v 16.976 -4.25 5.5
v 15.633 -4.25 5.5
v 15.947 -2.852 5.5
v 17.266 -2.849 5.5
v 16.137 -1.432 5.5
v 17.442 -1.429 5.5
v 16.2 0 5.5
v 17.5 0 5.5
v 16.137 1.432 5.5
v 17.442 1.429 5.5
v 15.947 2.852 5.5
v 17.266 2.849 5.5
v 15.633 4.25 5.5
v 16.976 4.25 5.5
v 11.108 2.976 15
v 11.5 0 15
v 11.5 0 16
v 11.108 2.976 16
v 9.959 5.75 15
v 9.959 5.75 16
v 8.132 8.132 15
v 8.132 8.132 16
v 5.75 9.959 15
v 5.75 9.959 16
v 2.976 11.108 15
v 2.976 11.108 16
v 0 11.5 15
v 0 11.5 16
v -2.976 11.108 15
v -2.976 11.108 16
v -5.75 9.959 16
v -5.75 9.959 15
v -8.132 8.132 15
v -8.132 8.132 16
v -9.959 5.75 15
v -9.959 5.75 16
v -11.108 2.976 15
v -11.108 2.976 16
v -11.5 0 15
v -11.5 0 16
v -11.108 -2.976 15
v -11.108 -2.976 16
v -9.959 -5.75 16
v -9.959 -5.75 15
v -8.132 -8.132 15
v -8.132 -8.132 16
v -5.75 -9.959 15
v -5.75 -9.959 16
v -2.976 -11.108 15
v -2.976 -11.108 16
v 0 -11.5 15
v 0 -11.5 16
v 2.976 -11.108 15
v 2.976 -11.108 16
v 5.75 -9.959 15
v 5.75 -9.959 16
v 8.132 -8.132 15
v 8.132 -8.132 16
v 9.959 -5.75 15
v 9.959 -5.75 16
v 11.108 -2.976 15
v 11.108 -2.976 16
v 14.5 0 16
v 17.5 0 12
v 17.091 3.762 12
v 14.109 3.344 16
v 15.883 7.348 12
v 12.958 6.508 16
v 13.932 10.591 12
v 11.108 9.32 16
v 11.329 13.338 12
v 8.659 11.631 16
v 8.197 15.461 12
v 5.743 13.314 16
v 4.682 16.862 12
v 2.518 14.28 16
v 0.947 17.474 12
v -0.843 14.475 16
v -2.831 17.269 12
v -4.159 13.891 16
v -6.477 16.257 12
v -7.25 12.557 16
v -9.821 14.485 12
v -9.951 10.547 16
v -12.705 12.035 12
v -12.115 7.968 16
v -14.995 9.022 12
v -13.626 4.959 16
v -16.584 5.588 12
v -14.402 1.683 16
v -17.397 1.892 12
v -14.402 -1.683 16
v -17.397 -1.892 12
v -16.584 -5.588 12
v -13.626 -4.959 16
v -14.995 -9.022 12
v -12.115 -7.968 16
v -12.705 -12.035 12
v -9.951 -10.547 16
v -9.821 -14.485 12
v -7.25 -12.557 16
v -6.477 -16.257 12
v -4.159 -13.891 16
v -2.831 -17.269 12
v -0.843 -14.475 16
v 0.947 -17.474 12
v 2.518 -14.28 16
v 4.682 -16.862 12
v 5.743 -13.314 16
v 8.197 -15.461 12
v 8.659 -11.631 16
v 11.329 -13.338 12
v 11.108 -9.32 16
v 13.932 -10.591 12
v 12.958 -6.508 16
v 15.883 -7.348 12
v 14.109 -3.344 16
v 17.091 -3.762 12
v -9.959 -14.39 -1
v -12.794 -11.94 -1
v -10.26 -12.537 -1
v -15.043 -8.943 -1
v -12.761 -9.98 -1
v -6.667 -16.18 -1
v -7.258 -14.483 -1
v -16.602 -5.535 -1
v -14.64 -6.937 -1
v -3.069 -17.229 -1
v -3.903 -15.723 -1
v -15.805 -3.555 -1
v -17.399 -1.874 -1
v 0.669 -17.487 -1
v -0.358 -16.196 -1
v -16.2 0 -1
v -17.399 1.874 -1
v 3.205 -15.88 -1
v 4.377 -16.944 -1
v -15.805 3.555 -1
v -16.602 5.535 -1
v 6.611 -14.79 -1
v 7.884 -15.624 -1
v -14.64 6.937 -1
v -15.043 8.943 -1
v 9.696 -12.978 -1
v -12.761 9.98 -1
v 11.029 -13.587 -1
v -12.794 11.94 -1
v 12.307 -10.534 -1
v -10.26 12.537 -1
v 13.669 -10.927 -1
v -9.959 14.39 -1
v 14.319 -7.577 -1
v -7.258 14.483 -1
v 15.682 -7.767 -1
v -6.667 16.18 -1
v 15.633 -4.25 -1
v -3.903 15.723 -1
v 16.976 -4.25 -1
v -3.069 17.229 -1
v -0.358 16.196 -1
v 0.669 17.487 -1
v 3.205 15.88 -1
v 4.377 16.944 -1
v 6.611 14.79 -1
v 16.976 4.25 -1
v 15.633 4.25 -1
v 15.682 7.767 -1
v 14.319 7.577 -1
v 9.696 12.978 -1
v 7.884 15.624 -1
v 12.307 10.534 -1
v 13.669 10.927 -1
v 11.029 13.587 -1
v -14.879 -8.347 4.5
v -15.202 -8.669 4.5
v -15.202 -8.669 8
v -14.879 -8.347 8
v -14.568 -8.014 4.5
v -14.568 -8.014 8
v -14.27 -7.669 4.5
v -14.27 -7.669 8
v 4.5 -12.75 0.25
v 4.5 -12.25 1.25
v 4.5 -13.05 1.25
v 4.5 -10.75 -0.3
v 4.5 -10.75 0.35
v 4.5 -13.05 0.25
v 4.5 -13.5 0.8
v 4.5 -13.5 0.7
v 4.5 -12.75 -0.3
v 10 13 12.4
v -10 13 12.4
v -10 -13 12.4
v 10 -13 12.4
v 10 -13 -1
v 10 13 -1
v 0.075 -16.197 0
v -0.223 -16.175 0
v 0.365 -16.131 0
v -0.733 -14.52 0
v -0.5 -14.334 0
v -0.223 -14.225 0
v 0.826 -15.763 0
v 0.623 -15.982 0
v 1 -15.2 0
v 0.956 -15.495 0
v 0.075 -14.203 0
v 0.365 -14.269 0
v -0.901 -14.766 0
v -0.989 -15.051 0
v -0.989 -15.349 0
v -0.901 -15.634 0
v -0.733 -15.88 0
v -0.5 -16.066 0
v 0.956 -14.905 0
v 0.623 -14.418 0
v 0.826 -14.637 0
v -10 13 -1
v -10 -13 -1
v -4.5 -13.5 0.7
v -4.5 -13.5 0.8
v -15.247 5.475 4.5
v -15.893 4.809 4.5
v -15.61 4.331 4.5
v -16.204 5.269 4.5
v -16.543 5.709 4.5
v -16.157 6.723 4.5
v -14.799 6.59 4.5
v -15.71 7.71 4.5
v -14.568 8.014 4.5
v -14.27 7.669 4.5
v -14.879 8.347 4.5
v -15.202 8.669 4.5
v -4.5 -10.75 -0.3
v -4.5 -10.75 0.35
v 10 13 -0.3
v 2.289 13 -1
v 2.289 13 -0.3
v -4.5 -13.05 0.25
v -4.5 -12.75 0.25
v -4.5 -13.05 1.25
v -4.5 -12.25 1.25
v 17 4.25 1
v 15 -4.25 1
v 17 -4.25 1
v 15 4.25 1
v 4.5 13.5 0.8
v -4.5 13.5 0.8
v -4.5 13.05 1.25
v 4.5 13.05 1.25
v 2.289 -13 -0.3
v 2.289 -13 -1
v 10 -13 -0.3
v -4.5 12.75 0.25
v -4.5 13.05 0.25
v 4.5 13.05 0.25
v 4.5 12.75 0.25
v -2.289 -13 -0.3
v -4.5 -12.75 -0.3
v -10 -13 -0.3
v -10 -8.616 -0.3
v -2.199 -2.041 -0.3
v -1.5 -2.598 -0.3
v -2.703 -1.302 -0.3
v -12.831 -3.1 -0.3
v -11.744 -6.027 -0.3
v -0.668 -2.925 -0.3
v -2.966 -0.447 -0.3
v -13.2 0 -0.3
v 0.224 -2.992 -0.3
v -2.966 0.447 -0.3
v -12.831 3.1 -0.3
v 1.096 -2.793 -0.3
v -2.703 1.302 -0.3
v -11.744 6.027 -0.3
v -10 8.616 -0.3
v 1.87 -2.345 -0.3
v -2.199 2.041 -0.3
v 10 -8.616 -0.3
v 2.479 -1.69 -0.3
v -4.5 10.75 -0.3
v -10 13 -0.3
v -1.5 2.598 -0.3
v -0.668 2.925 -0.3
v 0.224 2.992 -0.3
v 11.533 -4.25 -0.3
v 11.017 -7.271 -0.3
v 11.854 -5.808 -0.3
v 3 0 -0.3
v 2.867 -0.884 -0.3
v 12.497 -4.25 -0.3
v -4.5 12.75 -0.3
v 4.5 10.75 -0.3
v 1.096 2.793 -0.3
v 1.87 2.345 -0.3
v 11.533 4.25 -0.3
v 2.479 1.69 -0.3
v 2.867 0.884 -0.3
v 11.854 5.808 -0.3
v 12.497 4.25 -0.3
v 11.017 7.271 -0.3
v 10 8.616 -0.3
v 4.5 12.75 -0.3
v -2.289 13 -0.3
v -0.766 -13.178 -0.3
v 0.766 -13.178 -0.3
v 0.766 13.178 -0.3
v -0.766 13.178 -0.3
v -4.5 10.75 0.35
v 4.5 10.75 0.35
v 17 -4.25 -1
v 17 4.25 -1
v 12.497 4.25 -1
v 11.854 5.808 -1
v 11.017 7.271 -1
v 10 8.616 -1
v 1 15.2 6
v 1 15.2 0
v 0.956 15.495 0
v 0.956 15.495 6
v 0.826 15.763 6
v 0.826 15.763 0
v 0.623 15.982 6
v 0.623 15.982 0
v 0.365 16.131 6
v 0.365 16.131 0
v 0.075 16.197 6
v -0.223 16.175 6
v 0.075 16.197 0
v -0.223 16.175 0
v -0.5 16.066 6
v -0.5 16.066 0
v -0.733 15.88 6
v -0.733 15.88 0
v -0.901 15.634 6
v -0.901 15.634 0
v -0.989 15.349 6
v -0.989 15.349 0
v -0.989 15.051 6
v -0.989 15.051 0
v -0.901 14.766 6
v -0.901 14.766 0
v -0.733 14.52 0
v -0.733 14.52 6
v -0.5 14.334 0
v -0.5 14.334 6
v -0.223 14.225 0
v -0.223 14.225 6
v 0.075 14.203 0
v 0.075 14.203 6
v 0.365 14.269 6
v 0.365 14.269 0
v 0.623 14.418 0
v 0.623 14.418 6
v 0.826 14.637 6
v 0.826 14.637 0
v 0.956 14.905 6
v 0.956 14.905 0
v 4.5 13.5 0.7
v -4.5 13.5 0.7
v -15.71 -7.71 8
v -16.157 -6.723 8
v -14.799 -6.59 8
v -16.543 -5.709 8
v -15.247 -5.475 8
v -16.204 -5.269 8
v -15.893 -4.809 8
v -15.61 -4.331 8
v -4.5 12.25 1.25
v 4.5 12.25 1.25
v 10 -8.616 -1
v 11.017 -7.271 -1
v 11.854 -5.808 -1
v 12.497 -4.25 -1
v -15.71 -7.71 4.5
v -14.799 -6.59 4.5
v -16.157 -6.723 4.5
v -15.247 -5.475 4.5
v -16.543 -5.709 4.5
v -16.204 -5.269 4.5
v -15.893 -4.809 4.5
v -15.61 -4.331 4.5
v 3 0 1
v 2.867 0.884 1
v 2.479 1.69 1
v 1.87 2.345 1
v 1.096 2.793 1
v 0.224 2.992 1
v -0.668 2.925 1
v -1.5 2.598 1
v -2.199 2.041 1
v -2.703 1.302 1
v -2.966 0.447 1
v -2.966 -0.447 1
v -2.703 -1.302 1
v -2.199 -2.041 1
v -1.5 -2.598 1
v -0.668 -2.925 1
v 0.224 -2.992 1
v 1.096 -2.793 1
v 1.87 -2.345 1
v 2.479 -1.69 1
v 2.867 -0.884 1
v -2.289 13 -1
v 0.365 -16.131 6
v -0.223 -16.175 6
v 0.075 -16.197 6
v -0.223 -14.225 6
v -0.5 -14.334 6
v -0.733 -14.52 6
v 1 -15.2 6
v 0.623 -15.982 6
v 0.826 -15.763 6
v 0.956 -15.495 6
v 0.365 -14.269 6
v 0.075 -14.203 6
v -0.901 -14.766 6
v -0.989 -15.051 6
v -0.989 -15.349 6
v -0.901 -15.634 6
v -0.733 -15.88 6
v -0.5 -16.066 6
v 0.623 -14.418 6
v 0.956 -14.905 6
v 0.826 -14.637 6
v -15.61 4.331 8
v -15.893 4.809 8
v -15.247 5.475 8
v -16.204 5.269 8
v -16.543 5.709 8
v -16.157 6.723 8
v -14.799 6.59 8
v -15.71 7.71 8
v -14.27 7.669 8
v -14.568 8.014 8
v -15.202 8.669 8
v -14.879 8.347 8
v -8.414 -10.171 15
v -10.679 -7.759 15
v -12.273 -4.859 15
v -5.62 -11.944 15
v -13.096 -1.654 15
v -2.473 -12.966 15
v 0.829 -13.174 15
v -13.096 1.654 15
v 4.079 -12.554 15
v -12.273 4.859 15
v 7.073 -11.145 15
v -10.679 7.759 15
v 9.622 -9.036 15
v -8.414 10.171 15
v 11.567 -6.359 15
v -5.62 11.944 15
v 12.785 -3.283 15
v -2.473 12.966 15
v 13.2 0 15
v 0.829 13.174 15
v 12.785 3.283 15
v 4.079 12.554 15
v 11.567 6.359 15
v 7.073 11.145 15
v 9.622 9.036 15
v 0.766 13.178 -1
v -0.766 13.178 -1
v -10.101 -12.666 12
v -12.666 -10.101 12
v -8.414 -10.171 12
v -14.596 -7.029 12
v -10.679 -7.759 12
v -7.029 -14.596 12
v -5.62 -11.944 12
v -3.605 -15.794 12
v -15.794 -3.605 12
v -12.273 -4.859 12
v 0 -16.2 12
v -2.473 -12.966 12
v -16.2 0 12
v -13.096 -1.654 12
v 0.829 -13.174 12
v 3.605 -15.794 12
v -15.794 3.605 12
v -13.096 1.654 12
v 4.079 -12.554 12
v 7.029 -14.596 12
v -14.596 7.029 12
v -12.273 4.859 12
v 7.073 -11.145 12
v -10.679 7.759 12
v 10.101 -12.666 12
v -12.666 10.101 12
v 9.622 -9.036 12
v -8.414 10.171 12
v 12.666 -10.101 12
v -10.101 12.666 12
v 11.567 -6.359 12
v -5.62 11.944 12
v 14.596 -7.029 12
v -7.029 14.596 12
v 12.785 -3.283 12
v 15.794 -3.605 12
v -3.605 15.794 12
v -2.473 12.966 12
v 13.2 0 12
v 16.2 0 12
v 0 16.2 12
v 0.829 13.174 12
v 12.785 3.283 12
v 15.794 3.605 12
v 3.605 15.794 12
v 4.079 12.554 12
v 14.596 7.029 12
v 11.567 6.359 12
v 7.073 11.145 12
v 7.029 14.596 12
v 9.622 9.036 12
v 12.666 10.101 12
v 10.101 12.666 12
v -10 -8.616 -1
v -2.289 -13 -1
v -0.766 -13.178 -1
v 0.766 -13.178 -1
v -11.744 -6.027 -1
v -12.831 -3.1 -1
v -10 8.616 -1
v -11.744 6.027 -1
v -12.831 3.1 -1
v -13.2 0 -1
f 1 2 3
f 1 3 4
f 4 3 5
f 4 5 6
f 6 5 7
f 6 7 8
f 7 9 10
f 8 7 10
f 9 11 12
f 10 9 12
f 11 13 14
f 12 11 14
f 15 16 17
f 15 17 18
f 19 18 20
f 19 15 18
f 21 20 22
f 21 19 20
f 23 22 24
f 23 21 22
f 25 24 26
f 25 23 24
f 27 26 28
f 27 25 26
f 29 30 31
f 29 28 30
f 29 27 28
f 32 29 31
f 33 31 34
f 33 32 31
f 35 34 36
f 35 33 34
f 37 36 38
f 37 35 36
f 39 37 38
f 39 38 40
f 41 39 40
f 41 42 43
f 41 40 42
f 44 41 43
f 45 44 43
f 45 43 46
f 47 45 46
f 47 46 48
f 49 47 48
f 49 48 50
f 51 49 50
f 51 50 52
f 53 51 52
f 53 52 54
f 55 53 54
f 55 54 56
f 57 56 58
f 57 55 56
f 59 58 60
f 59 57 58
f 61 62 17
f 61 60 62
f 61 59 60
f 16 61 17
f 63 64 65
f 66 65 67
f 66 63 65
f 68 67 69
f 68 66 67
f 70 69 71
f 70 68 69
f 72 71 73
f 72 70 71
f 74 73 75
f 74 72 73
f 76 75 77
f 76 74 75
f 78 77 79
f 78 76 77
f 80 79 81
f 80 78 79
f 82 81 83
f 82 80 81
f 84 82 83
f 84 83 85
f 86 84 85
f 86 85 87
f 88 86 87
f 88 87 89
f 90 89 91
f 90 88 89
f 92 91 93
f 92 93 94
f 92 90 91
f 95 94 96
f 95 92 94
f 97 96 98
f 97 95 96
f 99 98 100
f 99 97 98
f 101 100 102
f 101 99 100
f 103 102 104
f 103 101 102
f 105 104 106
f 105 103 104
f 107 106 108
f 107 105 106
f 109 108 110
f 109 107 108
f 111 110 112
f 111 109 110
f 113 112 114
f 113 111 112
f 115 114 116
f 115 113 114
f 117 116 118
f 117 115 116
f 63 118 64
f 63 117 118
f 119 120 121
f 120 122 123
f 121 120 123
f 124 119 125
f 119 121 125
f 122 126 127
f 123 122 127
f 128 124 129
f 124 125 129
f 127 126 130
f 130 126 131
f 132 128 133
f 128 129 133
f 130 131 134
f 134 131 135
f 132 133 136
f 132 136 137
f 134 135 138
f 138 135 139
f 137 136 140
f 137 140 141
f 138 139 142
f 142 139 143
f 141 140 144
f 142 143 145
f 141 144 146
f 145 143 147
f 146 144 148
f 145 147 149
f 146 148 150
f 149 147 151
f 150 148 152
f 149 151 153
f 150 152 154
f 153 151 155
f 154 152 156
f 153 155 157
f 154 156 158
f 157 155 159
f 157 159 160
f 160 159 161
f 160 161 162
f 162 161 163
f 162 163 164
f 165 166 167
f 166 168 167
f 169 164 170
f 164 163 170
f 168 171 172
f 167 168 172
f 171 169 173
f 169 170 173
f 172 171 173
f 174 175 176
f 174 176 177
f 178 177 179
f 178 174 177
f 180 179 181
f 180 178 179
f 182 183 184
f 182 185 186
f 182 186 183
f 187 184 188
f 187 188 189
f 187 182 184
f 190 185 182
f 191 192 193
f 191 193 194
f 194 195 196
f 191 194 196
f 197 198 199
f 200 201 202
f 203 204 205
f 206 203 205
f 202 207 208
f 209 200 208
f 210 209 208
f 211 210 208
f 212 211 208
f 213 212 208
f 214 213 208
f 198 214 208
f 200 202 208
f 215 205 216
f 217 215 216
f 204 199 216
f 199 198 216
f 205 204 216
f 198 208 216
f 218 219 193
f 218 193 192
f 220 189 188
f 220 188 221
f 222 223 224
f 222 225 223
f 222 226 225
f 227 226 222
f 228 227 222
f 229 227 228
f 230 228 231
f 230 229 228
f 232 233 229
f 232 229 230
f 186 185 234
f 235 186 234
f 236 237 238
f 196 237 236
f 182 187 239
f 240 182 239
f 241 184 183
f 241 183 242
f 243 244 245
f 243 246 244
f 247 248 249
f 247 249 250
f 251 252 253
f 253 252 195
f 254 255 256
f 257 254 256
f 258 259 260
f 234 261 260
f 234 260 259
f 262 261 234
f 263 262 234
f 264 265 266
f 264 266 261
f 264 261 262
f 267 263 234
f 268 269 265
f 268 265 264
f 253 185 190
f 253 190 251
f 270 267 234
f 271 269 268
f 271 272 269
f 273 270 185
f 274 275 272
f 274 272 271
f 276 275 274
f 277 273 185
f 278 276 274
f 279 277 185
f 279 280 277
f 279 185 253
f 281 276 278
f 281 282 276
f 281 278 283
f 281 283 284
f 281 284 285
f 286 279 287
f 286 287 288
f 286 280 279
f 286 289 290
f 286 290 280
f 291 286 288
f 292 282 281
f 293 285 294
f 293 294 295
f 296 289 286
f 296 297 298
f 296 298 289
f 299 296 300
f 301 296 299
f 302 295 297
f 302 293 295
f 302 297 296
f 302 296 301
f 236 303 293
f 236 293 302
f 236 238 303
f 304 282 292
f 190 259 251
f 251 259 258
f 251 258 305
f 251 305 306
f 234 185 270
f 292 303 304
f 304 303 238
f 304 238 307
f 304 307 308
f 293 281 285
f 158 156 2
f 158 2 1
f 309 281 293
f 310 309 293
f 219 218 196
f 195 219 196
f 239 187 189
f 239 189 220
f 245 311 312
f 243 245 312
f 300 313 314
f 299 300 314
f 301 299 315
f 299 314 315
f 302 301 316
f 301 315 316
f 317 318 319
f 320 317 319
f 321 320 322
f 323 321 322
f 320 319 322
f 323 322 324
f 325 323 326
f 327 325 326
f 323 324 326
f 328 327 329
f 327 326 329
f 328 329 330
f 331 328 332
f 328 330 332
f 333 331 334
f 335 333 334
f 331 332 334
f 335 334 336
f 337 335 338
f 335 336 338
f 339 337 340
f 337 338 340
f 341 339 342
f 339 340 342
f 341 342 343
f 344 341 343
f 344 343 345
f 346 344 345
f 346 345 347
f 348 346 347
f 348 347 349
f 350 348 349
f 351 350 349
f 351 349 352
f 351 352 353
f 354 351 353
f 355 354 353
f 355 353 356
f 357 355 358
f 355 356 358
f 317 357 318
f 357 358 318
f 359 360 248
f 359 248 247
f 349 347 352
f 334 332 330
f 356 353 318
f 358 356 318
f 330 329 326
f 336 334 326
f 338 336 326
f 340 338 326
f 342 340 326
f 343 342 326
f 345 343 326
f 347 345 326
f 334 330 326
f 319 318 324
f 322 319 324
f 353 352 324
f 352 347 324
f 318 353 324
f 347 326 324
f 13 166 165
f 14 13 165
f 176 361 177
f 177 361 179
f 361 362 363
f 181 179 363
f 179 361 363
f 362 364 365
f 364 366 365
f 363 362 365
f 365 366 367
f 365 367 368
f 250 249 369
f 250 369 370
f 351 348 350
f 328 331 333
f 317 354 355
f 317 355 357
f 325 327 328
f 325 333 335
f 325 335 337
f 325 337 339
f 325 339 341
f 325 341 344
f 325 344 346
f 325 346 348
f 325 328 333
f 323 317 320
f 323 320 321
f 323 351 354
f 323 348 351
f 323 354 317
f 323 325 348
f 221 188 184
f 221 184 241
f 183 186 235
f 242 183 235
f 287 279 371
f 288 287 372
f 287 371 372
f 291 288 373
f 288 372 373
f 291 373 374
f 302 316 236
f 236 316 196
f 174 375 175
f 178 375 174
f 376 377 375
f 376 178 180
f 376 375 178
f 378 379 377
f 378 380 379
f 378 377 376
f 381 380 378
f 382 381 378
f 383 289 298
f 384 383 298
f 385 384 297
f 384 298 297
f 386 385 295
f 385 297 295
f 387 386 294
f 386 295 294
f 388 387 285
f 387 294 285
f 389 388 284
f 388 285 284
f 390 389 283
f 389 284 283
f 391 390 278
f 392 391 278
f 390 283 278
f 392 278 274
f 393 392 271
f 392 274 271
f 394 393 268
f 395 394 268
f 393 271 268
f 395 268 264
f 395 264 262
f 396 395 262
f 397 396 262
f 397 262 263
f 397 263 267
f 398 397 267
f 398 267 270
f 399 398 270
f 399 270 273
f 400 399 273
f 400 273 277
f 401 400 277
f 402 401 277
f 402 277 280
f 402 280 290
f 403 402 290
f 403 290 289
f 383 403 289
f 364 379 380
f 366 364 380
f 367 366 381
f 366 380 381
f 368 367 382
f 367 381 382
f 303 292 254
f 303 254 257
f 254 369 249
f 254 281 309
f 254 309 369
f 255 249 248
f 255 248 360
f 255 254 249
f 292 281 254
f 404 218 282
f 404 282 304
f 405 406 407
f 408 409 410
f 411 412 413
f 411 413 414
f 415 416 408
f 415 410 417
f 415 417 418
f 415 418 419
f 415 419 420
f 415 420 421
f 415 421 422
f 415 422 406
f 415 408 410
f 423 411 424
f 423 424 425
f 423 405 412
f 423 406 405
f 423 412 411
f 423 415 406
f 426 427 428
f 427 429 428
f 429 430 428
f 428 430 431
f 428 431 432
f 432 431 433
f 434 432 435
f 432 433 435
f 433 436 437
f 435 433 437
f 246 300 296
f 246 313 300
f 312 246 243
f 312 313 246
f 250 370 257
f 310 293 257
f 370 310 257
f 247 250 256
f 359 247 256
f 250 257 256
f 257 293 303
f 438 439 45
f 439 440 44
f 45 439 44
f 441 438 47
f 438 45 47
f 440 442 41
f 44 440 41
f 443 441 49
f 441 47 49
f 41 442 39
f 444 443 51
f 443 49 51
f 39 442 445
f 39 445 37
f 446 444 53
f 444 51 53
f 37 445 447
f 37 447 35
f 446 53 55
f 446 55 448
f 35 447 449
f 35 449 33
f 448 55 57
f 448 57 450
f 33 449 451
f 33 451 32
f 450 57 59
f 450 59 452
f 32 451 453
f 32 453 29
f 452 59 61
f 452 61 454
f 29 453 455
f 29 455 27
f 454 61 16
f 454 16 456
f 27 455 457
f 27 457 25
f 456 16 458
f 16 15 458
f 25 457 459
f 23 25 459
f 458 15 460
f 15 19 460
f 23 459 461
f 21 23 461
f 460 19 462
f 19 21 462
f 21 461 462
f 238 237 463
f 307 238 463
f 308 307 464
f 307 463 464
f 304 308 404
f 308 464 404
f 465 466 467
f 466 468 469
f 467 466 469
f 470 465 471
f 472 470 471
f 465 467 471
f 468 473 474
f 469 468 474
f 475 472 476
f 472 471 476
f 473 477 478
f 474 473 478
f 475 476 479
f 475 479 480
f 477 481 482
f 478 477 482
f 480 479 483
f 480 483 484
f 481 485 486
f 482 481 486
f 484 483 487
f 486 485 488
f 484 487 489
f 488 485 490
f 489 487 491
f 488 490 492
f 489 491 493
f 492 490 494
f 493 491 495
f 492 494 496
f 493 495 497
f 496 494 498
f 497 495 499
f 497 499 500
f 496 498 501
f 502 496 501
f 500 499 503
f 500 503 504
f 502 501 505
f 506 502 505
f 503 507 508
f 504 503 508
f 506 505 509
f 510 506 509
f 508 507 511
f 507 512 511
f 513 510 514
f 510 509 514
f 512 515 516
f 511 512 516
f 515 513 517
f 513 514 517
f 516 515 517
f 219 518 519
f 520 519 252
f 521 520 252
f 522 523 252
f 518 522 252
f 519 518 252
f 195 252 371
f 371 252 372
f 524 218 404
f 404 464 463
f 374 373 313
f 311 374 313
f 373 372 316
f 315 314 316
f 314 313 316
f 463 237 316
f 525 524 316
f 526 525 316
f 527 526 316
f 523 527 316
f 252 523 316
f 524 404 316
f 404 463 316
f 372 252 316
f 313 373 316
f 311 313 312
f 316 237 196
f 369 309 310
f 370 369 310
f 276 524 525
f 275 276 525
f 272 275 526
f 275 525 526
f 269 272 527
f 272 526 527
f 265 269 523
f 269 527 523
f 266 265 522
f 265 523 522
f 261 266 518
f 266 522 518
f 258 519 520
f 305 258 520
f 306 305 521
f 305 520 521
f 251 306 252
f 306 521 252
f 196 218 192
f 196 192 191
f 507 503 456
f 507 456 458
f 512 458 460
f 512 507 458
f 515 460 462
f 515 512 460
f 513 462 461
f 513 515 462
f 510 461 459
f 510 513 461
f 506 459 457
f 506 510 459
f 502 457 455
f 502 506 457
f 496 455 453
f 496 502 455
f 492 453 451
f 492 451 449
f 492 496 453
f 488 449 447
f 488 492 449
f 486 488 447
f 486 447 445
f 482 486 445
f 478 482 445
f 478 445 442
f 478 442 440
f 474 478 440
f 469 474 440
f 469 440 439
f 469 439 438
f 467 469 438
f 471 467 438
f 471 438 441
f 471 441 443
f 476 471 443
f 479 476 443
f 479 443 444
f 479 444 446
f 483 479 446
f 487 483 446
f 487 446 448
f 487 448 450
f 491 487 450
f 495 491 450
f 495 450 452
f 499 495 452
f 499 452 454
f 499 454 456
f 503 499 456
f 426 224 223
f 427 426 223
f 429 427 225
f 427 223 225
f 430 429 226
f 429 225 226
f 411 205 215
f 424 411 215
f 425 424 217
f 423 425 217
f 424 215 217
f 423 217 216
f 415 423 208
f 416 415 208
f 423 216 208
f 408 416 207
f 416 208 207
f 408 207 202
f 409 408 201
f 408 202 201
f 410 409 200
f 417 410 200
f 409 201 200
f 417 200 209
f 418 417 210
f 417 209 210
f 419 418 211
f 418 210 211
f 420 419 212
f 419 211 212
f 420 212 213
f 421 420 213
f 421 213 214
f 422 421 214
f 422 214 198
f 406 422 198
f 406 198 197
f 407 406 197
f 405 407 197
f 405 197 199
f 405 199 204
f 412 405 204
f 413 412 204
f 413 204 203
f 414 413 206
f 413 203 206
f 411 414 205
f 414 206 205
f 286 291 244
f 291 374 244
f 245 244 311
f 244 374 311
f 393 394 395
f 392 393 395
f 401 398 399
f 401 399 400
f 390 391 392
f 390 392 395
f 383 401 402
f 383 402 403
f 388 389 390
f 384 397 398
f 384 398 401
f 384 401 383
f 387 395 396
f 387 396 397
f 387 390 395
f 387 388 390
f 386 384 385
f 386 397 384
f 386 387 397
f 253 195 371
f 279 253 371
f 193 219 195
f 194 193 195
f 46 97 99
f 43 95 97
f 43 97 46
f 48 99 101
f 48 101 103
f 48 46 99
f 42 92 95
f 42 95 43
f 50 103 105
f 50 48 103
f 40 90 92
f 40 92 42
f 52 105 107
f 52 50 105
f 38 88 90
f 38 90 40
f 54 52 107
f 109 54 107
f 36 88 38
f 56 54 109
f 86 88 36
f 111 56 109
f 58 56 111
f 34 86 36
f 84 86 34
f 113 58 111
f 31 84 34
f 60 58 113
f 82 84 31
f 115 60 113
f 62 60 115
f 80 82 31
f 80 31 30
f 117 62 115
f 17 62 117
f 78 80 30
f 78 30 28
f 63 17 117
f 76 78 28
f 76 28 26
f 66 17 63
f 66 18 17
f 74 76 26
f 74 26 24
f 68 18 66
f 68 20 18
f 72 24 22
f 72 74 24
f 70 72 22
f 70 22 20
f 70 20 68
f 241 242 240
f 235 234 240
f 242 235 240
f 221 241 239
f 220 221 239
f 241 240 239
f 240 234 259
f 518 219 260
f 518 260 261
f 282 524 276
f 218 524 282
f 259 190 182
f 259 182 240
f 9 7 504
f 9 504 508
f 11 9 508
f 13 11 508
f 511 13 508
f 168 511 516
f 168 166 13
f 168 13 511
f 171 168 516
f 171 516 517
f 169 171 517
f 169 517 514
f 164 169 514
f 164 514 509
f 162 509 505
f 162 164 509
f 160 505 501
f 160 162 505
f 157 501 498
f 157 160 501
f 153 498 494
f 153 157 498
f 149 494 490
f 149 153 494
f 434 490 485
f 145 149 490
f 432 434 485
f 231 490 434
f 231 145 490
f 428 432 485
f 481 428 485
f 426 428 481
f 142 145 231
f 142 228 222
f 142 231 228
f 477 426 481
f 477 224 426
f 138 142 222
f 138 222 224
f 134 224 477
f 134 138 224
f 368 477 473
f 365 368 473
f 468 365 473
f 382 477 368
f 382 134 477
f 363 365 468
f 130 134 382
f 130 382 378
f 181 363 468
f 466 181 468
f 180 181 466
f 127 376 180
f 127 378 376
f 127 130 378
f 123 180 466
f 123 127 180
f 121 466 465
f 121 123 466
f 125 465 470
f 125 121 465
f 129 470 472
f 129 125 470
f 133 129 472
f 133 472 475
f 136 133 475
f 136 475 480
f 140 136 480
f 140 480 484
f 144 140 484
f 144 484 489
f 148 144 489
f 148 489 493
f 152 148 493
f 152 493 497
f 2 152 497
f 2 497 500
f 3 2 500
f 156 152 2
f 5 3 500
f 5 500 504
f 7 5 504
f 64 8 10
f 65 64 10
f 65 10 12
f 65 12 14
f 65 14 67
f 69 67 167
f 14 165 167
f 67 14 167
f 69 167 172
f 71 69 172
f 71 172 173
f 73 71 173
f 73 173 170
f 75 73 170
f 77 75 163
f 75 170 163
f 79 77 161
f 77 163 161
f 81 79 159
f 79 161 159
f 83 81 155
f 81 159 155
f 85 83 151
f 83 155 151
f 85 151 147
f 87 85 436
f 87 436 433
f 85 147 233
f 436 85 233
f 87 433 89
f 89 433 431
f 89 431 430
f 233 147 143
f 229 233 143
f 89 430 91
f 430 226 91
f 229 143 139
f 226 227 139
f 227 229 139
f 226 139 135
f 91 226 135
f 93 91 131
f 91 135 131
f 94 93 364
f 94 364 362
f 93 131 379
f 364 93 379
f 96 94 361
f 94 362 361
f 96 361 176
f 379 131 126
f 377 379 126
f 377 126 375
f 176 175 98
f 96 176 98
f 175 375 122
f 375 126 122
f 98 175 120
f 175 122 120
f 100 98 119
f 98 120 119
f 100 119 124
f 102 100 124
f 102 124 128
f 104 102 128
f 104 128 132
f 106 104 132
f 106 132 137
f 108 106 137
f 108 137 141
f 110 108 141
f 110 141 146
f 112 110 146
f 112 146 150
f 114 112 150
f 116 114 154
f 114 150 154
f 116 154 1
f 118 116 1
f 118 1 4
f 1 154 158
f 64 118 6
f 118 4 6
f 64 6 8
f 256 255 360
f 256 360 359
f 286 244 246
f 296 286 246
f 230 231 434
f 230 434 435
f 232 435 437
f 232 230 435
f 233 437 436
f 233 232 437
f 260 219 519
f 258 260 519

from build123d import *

# Parameters (mm, degrees)
BOX_W                      = 20
BOX_H                      = 26
BOX_DEPTH                  = 13.4
CYLINDER007_R              = 1
CYLINDER007_DEPTH          = 6
CYLINDER008_R              = 1
CYLINDER008_DEPTH          = 6
CYLINDER002_R              = 11.5
CYLINDER002_DEPTH          = 30
BOX001_W                   = 16
BOX001_H                   = 8.5
BOX001_DEPTH               = 7
CYLINDER018_R              = 9
CYLINDER018_DEPTH          = 3.5
CYLINDER017_R              = 12
CYLINDER017_DEPTH          = 3.5
BOX006_W                   = 10
BOX006_H                   = 2
BOX006_DEPTH               = 1.5
BOX007_W                   = 10
BOX007_H                   = 2
BOX007_DEPTH               = 1.5
CYLINDER020_R              = 16.2
CYLINDER020_DEPTH          = 13
CYLINDER_R                 = 13.2
CYLINDER_DEPTH             = 16
CYLINDER006_R              = 17.5
CYLINDER006_DEPTH          = 17
CHAMFER_SIZE2              = 3
CHAMFER_SIZE               = 4
BOX002_W                   = 20
BOX002_H                   = 26
BOX002_DEPTH               = 0.7
CYLINDER016_R              = 3
CYLINDER016_DEPTH          = 1.5
BOX003_W                   = 6
BOX003_H                   = 8.5
BOX003_DEPTH               = 2
CHAMFER004_SIZE2           = 4
CHAMFER004_SIZE            = 1.5
BOX008_W                   = 9
BOX008_H                   = 2
BOX008_DEPTH               = 1
BOX004_W                   = 9
BOX004_H                   = 2.75
BOX004_DEPTH               = 1
CHAMFER005_SIZE2           = 0.9
CHAMFER005_SIZE            = 1.5
CHAMFER006_SIZE            = 0.45
CHAMFER006_PLACEMENT_ANGLE = 180
CHAMFER007_SIZE            = 0.45
CYLINDER019_R              = 13.2
CYLINDER019_DEPTH          = 0.7


with BuildPart() as batteryhole:
    # Box → Box (new body)
    with BuildSketch(Plane(origin=(-10, -13, -1), x_dir=(1, 0, 0), z_dir=(0, 0, 1))):
        with Locations((10, 13)):
            Rectangle(BOX_W, BOX_H)
    extrude(amount=BOX_DEPTH)


with BuildPart() as r_screw:
    # Cylinder007 → Cylinder007 (new body)
    with BuildSketch(Plane(origin=(0, -15.2, 0), x_dir=(1, 0, 0), z_dir=(0, 0, 1))):
        Circle(CYLINDER007_R)
    extrude(amount=CYLINDER007_DEPTH)


with BuildPart() as l_screw:
    # Cylinder008 → Cylinder008 (new body)
    with BuildSketch(Plane(origin=(0, 15.2, 0), x_dir=(1, 0, 0), z_dir=(0, 0, 1))):
        Circle(CYLINDER008_R)
    extrude(amount=CYLINDER008_DEPTH)


with BuildPart() as diffuserhole:
    # Cylinder002 → Cylinder002 (new body)
    with BuildSketch(Plane.XY):
        Circle(CYLINDER002_R)
    extrude(amount=CYLINDER002_DEPTH)


with BuildPart() as usb:
    # Box001 → Box001 (new body)
    with BuildSketch(Plane(origin=(7, -4.25, -1.5), x_dir=(1, 0, 0), z_dir=(0, 0, 1))):
        with Locations((8, 4.25)):
            Rectangle(BOX001_W, BOX001_H)
    extrude(amount=BOX001_DEPTH)


with BuildPart() as cylinder001:
    # Cylinder018 → Cylinder018 (new body)
    with BuildSketch(Plane(origin=(-23.5, 0, 4.5), x_dir=(1, 0, 0), z_dir=(0, 0, 1))):
        Circle(CYLINDER018_R)
    extrude(amount=CYLINDER018_DEPTH)


with BuildPart() as chain_channel:
    # Cylinder017 → Cylinder017 (new body)
    with BuildSketch(Plane(origin=(-23.5, 0, 4.5), x_dir=(1, 0, 0), z_dir=(0, 0, 1))):
        Circle(CYLINDER017_R)
    extrude(amount=CYLINDER017_DEPTH)

    # Cut002: cut Cylinder001
    add(cylinder001.part, mode=Mode.SUBTRACT)


with BuildPart() as tab_2_female:
    # Box006 → Box006 (new body)
    with BuildSketch(Plane(origin=(-5, -14, 0), x_dir=(1, 0, 0), z_dir=(0, 0, 1))):
        with Locations((5, 1)):
            Rectangle(BOX006_W, BOX006_H)
    extrude(amount=BOX006_DEPTH)


with BuildPart() as tab_1_female:
    # Box007 → Box007 (new body)
    with BuildSketch(Plane(origin=(-5, 12, 0), x_dir=(1, 0, 0), z_dir=(0, 0, 1))):
        with Locations((5, 1)):
            Rectangle(BOX007_W, BOX007_H)
    extrude(amount=BOX007_DEPTH)


with BuildPart() as hollow_out:
    # Cylinder020 → Cylinder020 (new body)
    with BuildSketch(Plane.XY.offset(-1)):
        Circle(CYLINDER020_R)
    extrude(amount=CYLINDER020_DEPTH)


with BuildPart() as guts:
    # Cylinder → Cylinder (new body)
    with BuildSketch(Plane.XY.offset(-1)):
        Circle(CYLINDER_R)
    extrude(amount=CYLINDER_DEPTH)

    # Fusion: union DiffuserHole, USB, Chain Channel, Tab 2 Female, Tab 1 Female, Hollow Out
    add(diffuserhole.part)
    add(usb.part)
    add(chain_channel.part)
    add(tab_2_female.part)
    add(tab_1_female.part)
    add(hollow_out.part)


with BuildPart() as front:
    # Cylinder006 → Cylinder006 (new body)
    with BuildSketch(Plane.XY.offset(-1)):
        Circle(CYLINDER006_R)
    extrude(amount=CYLINDER006_DEPTH)

    # Chamfer
    chamfer_edges = [front.edges().sort_by_distance(p)[0] for p in [
        (-17.5, 0, 16),
    ]]
    chamfer_side = front.faces().sort_by_distance((-17.5, 0, 7.5))[0]
    chamfer(chamfer_edges, length=CHAMFER_SIZE, length2=CHAMFER_SIZE2, reference=chamfer_side)

    # Cut: cut Guts
    add(guts.part, mode=Mode.SUBTRACT)


with BuildPart() as batteryhole001:
    # Box002 → Box002 (new body)
    with BuildSketch(Plane(origin=(-10, -13, -1), x_dir=(1, 0, 0), z_dir=(0, 0, 1))):
        with Locations((10, 13)):
            Rectangle(BOX002_W, BOX002_H)
    extrude(amount=BOX002_DEPTH)


with BuildPart() as button_presser:
    # Cylinder016 → Cylinder016 (new body)
    with BuildSketch(Plane.XY.offset(-0.5)):
        Circle(CYLINDER016_R)
    extrude(amount=CYLINDER016_DEPTH)


with BuildPart() as usb_cover:
    # Box003 → Box003 (new body)
    with BuildSketch(Plane(origin=(11, -4.25, -1), x_dir=(1, 0, 0), z_dir=(0, 0, 1))):
        with Locations((3, 4.25)):
            Rectangle(BOX003_W, BOX003_H)
    extrude(amount=BOX003_DEPTH)

    # Chamfer004
    chamfer004_edges = [usb_cover.edges().sort_by_distance(p)[0] for p in [
        (11, 0, 1),
    ]]
    chamfer004_side = usb_cover.faces().sort_by_distance((11, 0, 0))[0]
    chamfer(chamfer004_edges, length=CHAMFER004_SIZE, length2=CHAMFER004_SIZE2, reference=chamfer004_side)


with BuildPart() as tab_base:
    # Box008 → Box008 (new body)
    with BuildSketch(Plane(origin=(-4.5, 10.75, -0.75), x_dir=(1, 0, 0), z_dir=(0, 0, 1))):
        with Locations((4.5, 1)):
            Rectangle(BOX008_W, BOX008_H)
    extrude(amount=BOX008_DEPTH)


with BuildPart() as chamfer005:
    # Box004 → Box004 (new body)
    with BuildSketch(Plane(origin=(-4.5, 10.75, 0.25), x_dir=(1, 0, 0), z_dir=(0, 0, 1))):
        with Locations((4.5, 1.375)):
            Rectangle(BOX004_W, BOX004_H)
    extrude(amount=BOX004_DEPTH)

    # Fusion002: union Tab Base
    add(tab_base.part)

    # Chamfer005
    chamfer005_edges = [chamfer005.edges().sort_by_distance(p)[0] for p in [
        (0, 10.75, 1.25),
    ]]
    chamfer005_side = chamfer005.faces().sort_by_distance((0, 12.125, 1.25))[0]
    chamfer(chamfer005_edges, length=CHAMFER005_SIZE, length2=CHAMFER005_SIZE2, reference=chamfer005_side)


with BuildPart() as chamfer006:
    # Chamfer006 base: copy of Chamfer005
    add(chamfer005.part)

    # Chamfer006
    chamfer006_edges = [chamfer006.edges().sort_by_distance(p)[0] for p in [
        (0, 13.5, 1.25),
        (0, 13.5, 0.25),
    ]]
    chamfer(chamfer006_edges, length=CHAMFER006_SIZE)


with BuildPart() as chamfer006_1:
    # Chamfer006 placement: moved
    add(chamfer006.part.rotate(Axis((0, 0, 0), (0, 0, 1)), CHAMFER006_PLACEMENT_ANGLE))


with BuildPart() as chamfer007:
    # Chamfer007 base: copy of Chamfer005
    add(chamfer005.part)

    # Chamfer007
    chamfer007_edges = [chamfer007.edges().sort_by_distance(p)[0] for p in [
        (0, 13.5, 1.25),
        (0, 13.5, 0.25),
    ]]
    chamfer(chamfer007_edges, length=CHAMFER007_SIZE)


with BuildPart() as back:
    # Cylinder019 → Cylinder019 (new body)
    with BuildSketch(Plane.XY.offset(-1)):
        Circle(CYLINDER019_R)
    extrude(amount=CYLINDER019_DEPTH)

    # Fusion001: union BatteryHole001, Button Presser, USB Cover, Chamfer006, Chamfer007
    add(batteryhole001.part)
    add(button_presser.part)
    add(usb_cover.part)
    add(chamfer006_1.part)
    add(chamfer007.part)


solid = Compound([batteryhole.part, r_screw.part, l_screw.part, front.part, back.part])
